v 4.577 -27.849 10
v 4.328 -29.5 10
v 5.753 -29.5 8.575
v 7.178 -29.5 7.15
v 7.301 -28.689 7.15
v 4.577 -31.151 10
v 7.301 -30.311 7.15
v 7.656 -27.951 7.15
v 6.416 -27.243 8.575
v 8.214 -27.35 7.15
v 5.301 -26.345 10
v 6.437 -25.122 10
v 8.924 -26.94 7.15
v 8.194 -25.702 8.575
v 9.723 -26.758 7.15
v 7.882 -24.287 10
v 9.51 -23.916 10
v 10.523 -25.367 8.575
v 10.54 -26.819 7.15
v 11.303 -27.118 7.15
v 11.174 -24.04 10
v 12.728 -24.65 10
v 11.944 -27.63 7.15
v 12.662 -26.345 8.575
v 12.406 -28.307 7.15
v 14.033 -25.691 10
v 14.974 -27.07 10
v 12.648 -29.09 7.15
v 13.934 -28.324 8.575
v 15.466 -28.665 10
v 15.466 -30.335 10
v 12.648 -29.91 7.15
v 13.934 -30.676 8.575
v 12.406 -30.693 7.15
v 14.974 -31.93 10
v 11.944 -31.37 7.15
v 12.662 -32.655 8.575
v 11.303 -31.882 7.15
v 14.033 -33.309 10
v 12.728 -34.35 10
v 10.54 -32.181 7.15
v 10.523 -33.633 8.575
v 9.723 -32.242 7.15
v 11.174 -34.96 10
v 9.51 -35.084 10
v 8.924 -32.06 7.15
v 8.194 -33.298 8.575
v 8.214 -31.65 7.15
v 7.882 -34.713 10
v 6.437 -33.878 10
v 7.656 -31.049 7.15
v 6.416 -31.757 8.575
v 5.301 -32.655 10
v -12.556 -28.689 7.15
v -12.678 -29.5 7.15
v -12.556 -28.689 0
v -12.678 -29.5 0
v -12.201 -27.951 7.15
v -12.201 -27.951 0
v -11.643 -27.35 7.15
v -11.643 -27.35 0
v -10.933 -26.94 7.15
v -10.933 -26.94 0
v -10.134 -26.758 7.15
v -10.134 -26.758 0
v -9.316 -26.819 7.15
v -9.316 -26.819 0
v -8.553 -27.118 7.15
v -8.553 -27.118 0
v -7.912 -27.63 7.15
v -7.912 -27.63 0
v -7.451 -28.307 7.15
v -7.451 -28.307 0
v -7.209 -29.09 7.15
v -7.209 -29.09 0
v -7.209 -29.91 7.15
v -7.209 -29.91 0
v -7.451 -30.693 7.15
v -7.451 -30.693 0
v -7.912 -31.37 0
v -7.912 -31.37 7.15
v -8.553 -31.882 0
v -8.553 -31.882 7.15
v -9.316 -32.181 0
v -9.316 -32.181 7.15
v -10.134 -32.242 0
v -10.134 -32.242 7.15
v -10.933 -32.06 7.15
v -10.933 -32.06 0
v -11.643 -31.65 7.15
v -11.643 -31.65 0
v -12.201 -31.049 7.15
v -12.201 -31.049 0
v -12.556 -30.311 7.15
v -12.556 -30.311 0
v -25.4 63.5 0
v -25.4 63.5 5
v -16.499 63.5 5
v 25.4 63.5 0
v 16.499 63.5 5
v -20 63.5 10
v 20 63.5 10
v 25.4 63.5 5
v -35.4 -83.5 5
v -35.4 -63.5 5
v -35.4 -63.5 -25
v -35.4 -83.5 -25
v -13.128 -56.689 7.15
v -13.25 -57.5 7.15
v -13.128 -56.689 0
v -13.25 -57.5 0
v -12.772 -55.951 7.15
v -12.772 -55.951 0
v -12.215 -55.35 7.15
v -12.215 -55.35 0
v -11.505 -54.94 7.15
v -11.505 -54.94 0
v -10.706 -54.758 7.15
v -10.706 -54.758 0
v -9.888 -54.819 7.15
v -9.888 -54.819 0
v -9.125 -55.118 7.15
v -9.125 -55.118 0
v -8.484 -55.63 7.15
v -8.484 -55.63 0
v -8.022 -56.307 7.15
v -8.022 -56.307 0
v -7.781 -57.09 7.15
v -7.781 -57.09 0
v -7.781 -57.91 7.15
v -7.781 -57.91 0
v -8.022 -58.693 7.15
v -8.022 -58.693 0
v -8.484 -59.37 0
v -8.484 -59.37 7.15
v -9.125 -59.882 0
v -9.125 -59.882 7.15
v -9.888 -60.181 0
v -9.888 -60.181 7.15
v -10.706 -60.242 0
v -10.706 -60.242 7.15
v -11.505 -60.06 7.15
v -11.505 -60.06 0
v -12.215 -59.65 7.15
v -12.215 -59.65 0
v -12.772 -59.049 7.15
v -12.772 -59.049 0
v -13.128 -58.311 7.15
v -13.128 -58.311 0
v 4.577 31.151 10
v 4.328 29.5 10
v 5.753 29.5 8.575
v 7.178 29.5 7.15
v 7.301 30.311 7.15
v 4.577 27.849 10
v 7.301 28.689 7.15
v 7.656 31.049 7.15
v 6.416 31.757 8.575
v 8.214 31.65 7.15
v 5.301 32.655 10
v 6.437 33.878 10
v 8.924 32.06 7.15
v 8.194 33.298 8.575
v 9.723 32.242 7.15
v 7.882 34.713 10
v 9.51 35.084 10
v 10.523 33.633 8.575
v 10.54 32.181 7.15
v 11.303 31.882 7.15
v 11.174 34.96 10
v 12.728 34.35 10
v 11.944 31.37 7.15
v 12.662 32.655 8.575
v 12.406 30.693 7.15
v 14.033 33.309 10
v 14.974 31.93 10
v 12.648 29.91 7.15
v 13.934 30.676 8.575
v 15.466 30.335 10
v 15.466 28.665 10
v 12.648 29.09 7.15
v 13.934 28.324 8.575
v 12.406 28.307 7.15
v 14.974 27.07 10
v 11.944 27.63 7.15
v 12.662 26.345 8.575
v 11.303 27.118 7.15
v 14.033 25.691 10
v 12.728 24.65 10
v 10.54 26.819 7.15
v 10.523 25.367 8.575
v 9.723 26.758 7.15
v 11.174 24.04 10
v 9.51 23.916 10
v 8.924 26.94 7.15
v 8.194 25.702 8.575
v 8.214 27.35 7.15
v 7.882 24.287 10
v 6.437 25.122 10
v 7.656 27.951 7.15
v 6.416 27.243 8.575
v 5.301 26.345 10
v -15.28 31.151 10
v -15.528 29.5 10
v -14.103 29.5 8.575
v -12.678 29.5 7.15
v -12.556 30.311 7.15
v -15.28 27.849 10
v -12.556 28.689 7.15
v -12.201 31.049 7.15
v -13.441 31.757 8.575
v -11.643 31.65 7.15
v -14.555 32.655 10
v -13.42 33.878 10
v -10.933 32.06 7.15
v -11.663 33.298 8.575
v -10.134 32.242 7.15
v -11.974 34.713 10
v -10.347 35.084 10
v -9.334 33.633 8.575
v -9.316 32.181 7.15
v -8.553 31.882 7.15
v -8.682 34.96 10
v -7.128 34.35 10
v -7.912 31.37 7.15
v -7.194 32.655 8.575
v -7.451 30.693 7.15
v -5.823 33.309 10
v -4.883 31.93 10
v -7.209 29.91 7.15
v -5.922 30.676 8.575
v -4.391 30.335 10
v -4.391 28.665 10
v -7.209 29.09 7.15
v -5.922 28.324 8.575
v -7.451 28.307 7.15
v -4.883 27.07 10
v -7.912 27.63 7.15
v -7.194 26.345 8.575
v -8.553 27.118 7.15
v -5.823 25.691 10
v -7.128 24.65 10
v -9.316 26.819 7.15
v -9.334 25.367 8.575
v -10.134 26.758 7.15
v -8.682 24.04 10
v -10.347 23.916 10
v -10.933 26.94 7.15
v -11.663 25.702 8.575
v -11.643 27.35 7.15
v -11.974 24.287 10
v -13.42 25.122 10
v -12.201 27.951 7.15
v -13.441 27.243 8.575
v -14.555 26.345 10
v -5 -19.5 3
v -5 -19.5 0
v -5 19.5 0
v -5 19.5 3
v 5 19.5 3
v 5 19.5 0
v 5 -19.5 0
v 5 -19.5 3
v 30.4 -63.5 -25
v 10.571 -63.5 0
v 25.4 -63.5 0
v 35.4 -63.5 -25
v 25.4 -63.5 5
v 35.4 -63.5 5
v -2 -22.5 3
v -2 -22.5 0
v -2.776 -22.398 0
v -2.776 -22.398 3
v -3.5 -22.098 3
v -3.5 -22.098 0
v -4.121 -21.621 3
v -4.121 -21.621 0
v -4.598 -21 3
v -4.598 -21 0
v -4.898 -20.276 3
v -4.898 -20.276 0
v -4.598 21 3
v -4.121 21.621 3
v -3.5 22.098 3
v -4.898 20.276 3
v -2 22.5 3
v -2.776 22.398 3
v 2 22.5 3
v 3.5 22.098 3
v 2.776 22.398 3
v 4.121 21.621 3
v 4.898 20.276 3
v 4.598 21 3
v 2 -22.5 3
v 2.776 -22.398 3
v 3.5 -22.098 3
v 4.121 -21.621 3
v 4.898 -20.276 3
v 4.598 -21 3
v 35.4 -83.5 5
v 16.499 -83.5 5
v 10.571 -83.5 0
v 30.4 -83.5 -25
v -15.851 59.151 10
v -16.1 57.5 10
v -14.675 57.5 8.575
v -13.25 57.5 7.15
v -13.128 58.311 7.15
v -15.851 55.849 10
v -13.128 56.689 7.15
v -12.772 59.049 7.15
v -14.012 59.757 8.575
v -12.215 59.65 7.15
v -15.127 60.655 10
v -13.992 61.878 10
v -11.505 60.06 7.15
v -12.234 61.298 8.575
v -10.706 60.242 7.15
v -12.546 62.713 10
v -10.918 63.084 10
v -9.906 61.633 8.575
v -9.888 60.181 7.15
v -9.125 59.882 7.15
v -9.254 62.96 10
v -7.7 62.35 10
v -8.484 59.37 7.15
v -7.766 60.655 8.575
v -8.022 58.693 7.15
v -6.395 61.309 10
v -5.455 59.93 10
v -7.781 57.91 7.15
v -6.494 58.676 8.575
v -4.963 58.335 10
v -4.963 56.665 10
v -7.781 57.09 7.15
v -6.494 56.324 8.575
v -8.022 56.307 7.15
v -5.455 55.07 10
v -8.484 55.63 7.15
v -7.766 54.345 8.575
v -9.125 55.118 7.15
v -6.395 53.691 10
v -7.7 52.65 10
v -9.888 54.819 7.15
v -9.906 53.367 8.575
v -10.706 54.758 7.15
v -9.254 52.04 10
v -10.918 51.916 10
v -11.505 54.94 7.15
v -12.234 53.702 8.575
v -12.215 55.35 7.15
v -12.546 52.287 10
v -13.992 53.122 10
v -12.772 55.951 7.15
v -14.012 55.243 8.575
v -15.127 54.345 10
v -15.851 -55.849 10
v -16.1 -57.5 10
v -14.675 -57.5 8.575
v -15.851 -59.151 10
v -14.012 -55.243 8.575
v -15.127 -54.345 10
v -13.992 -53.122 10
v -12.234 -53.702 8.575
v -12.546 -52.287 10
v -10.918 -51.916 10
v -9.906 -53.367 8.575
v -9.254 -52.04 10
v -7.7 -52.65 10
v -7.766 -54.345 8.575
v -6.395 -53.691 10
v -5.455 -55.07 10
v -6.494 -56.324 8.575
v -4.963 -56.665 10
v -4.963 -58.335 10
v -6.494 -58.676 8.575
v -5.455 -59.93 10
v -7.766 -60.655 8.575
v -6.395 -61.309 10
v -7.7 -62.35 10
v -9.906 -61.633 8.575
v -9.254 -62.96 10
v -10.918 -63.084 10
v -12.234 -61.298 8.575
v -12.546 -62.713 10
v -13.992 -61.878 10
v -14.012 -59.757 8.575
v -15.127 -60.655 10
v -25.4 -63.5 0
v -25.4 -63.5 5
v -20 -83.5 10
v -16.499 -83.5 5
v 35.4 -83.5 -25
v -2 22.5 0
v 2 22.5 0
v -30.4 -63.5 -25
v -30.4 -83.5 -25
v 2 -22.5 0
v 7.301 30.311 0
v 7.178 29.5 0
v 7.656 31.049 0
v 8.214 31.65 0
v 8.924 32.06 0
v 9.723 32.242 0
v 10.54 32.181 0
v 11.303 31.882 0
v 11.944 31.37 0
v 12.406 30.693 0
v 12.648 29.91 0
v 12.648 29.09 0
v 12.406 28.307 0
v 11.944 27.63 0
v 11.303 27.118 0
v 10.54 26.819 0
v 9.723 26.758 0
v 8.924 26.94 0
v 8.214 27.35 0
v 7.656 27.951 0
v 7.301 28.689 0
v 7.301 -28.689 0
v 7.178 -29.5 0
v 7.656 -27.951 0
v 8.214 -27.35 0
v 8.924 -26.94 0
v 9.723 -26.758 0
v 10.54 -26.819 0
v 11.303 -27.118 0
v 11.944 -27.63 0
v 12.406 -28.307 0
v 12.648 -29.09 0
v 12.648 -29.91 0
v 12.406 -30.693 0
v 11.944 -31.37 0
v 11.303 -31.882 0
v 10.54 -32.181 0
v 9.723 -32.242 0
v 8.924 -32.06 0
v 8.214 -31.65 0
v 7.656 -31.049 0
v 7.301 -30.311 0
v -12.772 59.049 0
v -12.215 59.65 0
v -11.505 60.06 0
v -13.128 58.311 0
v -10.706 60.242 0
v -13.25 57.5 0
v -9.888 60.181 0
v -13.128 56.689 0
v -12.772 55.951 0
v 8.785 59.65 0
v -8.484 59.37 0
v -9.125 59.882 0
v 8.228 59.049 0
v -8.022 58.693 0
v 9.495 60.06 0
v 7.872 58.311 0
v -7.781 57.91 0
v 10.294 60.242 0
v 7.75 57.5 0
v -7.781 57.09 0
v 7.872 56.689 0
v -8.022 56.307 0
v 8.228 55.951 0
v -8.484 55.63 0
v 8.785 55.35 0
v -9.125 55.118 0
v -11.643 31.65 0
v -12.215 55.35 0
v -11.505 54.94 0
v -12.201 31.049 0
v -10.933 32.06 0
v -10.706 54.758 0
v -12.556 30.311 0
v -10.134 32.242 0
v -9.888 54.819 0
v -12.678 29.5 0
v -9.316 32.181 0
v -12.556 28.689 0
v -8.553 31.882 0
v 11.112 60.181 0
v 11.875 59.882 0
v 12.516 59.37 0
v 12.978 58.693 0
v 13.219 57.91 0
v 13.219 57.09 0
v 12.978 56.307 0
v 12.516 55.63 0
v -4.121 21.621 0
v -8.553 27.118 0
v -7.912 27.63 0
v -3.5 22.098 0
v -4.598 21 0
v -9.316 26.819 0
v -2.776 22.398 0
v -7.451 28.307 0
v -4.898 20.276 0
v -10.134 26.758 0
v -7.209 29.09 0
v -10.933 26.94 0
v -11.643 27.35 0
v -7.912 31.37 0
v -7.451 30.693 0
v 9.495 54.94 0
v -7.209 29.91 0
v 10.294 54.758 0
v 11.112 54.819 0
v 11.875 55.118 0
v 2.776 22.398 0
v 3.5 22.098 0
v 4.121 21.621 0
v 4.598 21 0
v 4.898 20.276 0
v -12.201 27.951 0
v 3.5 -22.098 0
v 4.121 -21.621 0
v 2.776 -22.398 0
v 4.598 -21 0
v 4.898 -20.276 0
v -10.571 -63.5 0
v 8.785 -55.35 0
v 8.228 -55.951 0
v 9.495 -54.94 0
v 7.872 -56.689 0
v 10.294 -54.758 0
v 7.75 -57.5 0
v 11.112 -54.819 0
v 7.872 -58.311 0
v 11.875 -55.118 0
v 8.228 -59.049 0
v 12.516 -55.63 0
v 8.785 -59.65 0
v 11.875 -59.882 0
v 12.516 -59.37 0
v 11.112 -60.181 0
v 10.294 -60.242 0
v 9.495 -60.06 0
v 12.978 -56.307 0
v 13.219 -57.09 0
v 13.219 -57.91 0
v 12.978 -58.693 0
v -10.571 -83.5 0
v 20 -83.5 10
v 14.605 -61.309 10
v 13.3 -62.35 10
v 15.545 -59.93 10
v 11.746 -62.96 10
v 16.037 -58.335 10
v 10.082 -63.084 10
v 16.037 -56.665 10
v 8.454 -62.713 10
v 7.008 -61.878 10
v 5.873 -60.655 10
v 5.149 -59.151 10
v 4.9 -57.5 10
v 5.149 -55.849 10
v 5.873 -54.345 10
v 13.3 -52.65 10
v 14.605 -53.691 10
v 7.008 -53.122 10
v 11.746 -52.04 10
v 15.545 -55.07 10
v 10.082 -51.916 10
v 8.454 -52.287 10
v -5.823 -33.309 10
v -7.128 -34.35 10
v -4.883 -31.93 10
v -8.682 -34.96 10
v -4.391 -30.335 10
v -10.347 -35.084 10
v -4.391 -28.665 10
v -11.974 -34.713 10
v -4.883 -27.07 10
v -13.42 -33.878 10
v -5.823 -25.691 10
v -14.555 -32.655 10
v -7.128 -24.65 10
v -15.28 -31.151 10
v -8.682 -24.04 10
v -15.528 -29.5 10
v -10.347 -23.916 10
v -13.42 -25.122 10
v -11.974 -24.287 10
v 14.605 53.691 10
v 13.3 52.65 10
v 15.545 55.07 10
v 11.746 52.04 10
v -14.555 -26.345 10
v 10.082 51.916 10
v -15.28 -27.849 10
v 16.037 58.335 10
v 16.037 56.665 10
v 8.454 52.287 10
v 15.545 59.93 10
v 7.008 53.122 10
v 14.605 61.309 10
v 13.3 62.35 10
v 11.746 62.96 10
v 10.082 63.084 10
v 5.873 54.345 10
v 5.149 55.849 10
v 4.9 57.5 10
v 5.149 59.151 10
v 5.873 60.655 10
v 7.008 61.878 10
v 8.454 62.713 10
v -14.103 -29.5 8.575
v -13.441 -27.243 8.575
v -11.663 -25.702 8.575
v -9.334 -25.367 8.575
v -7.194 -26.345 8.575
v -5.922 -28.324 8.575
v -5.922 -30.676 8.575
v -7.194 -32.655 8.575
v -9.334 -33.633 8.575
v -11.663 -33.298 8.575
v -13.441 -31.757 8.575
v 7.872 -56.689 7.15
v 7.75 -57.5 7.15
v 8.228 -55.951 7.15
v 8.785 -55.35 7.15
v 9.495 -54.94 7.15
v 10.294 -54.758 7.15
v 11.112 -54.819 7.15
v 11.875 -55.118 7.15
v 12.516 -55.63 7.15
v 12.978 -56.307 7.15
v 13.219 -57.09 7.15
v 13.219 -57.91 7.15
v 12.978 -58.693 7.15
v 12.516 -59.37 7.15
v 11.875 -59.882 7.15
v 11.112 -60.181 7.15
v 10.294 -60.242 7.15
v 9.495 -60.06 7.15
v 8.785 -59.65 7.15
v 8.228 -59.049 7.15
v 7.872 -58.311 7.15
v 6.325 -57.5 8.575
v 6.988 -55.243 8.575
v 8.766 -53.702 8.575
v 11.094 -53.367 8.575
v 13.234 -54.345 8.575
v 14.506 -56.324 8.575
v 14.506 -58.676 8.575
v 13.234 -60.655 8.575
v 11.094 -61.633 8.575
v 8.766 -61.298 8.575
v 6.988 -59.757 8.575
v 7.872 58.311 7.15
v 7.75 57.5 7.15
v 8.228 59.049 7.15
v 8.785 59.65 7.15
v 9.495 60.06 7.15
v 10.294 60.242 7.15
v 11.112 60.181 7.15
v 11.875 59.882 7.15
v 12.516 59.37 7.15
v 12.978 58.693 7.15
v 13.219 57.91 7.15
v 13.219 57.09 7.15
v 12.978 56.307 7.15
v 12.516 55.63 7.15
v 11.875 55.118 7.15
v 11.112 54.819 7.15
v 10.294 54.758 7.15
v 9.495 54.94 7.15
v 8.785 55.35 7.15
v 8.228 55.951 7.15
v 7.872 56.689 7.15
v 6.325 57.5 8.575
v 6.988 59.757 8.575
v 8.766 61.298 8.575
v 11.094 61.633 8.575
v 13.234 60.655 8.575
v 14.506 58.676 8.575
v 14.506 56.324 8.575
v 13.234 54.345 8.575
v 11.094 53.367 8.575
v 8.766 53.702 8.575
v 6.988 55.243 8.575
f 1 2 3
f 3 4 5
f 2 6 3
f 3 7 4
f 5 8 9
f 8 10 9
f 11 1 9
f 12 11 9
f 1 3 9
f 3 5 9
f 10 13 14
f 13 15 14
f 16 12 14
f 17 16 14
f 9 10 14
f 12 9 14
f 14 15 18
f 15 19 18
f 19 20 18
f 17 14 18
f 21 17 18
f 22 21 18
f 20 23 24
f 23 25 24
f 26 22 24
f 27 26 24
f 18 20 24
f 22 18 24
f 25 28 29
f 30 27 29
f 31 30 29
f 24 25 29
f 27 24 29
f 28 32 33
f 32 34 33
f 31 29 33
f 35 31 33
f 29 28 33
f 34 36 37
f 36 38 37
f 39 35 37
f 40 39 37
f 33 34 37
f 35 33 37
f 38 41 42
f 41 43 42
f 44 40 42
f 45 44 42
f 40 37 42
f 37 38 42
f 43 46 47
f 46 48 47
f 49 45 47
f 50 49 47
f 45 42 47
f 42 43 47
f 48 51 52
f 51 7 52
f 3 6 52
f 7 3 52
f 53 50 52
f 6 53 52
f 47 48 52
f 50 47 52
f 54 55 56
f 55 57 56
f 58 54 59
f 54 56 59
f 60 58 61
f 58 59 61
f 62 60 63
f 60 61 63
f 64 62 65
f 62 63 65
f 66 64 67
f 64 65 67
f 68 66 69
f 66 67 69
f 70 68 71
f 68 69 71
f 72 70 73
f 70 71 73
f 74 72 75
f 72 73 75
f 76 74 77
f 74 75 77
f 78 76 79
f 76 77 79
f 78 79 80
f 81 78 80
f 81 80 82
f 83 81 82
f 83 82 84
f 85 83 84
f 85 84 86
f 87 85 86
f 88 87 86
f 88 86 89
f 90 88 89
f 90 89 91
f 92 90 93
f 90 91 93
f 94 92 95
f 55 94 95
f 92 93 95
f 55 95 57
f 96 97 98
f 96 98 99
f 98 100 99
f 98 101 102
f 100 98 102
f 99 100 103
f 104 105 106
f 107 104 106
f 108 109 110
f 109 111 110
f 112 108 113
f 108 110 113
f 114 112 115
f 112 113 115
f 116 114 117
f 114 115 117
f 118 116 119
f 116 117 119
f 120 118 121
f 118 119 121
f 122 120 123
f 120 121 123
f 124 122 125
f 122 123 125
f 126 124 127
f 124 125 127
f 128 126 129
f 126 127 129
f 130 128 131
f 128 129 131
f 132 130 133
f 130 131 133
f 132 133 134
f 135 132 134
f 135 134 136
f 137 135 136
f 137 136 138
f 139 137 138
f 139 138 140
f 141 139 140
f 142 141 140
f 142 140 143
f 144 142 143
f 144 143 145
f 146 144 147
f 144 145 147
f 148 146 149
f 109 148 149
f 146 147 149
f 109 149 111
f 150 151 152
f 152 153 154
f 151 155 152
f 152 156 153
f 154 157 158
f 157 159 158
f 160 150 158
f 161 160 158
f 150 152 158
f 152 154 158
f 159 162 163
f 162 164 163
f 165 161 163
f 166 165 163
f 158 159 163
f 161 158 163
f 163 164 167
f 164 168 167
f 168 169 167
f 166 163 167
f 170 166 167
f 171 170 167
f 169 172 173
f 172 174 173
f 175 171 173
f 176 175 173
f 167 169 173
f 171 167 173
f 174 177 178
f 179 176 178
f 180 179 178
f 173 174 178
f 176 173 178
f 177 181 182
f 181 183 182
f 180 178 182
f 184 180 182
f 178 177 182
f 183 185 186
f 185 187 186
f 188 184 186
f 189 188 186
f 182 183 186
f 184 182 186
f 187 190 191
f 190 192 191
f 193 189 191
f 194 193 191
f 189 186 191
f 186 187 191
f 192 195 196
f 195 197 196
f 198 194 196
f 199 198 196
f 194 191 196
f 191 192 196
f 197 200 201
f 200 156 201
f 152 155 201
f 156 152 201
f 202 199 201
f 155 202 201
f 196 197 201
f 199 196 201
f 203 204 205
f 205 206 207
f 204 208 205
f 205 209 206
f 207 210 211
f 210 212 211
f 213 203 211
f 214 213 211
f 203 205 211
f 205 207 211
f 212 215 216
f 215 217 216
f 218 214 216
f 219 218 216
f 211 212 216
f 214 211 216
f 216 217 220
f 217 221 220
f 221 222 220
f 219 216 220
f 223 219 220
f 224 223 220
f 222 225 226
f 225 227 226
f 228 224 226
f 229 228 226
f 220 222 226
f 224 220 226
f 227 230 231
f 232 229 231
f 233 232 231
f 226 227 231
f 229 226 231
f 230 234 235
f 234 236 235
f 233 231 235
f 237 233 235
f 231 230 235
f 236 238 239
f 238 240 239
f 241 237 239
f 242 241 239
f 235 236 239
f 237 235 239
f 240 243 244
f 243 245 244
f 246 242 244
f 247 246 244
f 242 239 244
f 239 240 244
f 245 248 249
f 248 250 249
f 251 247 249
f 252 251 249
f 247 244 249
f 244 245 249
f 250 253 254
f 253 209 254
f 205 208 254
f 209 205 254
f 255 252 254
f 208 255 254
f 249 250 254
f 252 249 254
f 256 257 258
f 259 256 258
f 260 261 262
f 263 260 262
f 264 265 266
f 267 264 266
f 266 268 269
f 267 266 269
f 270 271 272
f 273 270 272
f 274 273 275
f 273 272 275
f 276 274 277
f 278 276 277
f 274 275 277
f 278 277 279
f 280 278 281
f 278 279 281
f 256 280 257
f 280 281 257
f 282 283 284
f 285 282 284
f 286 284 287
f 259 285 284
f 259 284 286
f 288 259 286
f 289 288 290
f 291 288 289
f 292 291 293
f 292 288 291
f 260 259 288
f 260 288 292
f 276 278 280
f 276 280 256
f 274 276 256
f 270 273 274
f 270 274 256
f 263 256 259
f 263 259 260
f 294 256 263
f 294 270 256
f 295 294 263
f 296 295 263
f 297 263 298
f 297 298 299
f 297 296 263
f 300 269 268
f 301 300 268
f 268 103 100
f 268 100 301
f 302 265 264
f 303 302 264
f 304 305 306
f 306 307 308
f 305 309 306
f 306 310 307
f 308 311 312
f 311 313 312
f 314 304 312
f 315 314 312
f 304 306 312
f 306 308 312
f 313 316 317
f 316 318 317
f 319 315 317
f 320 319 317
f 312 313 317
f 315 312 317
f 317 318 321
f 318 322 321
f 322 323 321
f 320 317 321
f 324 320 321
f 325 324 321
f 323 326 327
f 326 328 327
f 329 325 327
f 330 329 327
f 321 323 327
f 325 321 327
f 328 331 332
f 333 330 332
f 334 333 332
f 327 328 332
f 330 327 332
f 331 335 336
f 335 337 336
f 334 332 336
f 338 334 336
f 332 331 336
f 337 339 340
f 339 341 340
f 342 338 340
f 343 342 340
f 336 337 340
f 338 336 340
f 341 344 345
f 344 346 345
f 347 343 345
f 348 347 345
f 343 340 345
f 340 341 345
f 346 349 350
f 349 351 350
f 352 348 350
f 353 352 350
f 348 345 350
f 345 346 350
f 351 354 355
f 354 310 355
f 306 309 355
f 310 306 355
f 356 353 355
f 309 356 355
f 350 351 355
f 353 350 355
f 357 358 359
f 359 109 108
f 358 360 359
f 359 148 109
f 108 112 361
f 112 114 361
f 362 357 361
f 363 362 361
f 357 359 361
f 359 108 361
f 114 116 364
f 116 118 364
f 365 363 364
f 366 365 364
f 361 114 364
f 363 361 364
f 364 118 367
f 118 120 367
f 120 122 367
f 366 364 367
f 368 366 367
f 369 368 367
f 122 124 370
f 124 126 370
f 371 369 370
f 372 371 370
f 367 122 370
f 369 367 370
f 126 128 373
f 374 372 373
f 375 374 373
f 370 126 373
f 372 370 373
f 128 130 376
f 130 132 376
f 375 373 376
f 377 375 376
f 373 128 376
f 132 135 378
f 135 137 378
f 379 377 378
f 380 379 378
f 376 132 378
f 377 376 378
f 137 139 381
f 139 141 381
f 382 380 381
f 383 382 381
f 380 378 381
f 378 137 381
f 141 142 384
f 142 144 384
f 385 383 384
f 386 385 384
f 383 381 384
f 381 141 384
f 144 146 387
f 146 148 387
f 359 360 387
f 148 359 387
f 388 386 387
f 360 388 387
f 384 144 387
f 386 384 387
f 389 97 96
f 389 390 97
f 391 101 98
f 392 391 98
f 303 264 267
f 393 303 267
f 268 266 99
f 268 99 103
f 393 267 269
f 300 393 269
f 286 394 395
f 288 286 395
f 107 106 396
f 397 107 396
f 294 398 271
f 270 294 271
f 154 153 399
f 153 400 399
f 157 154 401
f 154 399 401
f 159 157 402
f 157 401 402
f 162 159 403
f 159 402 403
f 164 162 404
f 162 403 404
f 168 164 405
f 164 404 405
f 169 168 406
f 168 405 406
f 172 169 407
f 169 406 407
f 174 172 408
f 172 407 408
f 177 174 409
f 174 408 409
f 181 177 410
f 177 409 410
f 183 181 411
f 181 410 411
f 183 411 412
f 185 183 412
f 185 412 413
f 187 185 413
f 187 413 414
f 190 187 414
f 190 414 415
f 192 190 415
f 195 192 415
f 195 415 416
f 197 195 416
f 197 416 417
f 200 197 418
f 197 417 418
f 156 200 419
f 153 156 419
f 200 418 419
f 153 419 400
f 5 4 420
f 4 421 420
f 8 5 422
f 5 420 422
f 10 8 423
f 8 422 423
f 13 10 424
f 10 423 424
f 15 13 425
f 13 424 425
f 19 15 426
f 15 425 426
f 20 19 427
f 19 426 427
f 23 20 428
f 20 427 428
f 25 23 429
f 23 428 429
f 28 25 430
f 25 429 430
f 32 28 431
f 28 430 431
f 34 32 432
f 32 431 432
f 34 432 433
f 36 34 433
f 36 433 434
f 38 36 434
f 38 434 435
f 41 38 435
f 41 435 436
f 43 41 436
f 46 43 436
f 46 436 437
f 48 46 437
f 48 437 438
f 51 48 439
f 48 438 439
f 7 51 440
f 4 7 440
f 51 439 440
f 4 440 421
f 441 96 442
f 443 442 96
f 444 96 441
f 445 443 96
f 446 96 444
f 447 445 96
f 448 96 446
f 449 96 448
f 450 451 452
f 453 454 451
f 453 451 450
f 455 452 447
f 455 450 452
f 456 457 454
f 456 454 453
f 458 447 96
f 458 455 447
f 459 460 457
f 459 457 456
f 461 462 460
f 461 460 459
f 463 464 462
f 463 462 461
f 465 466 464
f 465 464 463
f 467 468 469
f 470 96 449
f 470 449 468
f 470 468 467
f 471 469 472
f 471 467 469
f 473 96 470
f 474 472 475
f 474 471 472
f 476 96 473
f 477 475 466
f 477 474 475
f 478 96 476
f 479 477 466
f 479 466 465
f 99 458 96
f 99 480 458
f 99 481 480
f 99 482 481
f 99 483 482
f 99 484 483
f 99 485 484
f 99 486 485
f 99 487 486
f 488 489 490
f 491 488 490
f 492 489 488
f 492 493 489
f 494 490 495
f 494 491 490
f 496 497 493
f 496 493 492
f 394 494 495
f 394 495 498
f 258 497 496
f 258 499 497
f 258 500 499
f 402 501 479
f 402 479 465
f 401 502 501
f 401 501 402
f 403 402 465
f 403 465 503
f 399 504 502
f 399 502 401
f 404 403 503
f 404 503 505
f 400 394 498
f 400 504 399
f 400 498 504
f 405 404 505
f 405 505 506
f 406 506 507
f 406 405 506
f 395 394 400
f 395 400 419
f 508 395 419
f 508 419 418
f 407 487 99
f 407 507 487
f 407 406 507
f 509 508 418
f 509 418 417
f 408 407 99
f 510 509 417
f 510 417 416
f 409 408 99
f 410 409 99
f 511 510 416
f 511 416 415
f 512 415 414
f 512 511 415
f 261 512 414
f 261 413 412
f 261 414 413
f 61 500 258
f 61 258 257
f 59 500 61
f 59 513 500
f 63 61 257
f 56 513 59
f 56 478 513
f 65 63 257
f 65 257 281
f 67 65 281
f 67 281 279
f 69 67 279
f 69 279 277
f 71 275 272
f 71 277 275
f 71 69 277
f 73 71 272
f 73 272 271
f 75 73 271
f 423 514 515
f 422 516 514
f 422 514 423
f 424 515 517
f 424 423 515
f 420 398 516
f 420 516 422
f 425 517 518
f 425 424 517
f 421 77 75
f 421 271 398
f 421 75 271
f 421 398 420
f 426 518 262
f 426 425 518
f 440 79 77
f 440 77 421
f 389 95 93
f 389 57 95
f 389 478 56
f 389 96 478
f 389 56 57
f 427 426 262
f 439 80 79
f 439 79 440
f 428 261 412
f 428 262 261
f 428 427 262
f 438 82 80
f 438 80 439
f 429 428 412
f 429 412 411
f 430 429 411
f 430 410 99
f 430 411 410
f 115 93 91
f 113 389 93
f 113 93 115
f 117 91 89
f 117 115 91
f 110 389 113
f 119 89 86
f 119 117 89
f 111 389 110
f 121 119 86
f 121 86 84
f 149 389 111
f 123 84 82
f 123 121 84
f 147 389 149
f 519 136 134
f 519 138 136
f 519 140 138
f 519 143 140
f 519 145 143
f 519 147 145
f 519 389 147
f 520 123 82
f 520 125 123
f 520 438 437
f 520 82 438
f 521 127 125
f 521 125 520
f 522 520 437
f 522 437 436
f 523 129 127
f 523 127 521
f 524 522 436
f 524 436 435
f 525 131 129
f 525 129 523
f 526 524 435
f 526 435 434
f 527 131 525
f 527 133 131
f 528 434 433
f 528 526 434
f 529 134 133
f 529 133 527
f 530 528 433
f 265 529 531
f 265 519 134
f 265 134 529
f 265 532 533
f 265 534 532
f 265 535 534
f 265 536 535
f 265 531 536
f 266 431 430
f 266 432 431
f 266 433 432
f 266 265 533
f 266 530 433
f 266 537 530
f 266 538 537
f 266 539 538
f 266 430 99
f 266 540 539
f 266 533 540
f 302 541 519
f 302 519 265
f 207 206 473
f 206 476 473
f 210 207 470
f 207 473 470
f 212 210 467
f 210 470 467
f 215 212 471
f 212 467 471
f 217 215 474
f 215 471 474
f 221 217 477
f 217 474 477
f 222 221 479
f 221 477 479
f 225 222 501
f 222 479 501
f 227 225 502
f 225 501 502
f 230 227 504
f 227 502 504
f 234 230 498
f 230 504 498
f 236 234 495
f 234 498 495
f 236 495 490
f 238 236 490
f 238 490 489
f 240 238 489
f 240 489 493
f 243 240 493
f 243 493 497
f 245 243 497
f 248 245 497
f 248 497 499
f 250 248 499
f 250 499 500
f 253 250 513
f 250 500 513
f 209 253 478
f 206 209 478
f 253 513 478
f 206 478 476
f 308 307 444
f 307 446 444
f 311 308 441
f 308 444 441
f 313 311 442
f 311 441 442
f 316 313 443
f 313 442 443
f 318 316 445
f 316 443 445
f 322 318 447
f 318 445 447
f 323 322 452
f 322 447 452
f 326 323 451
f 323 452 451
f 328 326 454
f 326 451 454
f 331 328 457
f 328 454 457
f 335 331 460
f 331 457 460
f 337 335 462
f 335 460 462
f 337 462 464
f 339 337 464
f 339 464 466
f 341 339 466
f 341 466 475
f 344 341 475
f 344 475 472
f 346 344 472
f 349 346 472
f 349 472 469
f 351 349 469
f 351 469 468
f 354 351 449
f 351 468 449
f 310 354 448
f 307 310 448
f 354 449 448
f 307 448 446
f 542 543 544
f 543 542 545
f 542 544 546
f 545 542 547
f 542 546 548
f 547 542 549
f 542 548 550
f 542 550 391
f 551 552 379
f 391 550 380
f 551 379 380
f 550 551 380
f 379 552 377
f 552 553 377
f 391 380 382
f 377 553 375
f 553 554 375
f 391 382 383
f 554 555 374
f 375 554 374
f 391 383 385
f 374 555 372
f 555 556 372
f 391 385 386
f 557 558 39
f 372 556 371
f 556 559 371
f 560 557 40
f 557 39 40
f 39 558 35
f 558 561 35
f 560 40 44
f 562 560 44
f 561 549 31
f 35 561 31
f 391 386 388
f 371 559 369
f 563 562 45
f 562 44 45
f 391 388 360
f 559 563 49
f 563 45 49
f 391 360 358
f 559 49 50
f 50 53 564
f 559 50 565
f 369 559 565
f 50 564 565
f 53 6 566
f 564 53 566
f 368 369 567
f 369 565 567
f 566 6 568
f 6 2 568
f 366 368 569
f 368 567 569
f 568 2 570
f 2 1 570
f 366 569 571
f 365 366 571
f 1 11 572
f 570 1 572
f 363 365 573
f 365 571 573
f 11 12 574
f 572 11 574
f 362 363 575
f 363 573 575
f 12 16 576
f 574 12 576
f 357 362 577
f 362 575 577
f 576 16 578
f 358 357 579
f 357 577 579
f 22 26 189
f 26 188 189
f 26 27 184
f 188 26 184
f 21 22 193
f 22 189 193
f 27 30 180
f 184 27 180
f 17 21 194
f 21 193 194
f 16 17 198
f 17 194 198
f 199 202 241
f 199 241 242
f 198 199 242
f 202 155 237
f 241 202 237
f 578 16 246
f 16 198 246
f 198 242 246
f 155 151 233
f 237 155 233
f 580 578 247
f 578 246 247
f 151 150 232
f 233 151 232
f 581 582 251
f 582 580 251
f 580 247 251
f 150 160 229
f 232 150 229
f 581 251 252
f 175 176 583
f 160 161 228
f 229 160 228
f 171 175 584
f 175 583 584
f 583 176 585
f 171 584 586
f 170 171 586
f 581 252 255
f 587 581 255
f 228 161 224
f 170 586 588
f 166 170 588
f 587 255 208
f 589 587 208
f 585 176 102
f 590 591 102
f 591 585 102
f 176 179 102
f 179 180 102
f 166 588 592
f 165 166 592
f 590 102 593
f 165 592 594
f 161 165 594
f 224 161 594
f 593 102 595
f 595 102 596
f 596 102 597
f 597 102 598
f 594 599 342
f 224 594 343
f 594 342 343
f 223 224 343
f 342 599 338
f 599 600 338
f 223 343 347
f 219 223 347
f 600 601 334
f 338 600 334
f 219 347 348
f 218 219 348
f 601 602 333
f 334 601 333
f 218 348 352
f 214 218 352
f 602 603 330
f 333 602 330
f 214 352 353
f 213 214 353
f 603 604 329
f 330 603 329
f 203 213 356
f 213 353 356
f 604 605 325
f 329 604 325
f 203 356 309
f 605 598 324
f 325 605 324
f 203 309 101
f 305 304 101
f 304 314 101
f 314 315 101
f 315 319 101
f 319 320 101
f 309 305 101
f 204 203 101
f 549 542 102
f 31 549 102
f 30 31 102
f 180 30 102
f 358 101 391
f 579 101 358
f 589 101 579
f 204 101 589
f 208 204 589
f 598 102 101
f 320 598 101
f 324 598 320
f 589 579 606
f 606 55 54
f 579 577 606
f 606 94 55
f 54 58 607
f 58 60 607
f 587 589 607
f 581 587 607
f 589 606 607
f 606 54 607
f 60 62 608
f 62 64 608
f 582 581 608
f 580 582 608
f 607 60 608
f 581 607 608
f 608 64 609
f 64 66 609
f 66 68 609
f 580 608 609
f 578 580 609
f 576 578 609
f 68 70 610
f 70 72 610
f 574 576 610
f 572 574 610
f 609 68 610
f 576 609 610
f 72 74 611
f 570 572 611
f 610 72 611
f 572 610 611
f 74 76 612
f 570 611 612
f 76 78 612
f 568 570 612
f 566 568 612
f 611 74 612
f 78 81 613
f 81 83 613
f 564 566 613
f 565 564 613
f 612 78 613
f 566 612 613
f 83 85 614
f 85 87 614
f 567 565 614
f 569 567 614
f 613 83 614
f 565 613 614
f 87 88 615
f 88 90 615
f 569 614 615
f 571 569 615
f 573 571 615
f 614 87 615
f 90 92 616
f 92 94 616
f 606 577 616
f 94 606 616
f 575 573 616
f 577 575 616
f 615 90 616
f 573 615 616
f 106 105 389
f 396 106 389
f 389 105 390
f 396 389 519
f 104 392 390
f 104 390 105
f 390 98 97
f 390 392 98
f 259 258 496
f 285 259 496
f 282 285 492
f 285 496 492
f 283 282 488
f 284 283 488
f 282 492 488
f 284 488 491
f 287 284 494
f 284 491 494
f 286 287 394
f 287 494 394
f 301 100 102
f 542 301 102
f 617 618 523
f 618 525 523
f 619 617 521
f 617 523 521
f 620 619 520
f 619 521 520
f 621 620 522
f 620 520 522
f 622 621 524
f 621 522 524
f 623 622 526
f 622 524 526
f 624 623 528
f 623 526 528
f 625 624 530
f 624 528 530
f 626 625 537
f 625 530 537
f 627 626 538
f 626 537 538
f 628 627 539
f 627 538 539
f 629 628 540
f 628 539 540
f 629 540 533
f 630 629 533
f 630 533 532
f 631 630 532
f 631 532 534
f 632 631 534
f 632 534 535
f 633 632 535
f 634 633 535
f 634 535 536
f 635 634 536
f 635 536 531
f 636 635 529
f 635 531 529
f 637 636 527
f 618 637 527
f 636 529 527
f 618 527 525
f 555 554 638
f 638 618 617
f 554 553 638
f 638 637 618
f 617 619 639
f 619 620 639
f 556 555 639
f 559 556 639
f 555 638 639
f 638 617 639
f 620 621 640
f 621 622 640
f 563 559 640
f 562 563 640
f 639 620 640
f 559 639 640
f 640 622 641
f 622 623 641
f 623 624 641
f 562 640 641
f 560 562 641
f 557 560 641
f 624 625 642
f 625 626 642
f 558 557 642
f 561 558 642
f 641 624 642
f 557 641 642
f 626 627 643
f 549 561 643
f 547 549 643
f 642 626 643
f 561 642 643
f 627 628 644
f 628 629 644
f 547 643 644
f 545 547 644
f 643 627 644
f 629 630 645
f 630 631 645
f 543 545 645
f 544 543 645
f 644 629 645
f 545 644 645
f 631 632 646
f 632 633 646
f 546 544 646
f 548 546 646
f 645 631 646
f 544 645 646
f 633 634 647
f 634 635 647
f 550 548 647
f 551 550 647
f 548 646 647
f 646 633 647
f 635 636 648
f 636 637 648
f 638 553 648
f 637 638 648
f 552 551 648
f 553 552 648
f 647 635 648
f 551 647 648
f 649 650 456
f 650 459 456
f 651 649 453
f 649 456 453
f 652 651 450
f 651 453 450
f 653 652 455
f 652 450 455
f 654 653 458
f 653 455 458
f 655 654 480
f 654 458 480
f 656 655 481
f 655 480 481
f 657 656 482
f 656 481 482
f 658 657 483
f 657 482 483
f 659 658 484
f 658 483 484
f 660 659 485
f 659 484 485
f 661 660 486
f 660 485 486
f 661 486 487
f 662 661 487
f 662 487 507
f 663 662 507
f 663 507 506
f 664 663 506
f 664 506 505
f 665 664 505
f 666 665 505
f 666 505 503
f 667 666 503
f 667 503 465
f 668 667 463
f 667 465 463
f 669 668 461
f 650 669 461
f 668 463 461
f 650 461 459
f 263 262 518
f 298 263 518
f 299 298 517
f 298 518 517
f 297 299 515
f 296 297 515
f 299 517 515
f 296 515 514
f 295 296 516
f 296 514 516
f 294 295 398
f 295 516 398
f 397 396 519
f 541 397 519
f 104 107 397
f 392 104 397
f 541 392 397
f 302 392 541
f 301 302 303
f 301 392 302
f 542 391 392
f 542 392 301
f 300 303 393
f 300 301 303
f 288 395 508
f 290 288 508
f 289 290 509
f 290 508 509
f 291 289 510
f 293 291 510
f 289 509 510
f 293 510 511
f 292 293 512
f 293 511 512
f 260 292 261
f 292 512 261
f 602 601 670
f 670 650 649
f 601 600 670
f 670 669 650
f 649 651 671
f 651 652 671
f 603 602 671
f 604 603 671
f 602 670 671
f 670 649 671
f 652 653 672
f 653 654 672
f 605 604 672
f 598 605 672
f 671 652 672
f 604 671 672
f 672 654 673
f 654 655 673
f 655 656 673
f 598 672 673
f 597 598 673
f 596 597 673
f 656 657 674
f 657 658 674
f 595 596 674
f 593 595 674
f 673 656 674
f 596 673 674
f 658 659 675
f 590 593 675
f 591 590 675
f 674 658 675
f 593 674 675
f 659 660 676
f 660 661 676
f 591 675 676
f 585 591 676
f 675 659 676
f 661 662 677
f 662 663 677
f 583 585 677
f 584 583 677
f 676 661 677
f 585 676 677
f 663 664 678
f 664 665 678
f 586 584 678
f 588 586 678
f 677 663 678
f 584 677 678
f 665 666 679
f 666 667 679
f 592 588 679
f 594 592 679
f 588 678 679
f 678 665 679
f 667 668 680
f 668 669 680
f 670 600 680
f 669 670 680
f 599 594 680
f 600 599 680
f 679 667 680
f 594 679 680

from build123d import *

# Parameters (mm, degrees)
F1_DEPTH       = 63.5
F1_DEPTH_BACK  = 63.5
F4_DEPTH       = 3
F6_D           = 5.5
F6_CSINK_D     = 11.2
F6_CSINK_ANGLE = 90
F8_DEPTH       = 20
F9_DEPTH       = 20


with BuildPart() as f1:
    # F0 (on Front) → F1 (new body, two sides)
    with BuildSketch(Plane.XZ) as f1_sk:
        Polygon((-25.4, 5), (-25.4, 0), (25.4, 0), (25.4, 5), (16.498962309, 5), (20, 10), (-20, 10), (-16.498962309, 5), align=None)
    extrude(amount=F1_DEPTH)
    extrude(f1_sk.sketch, amount=-F1_DEPTH_BACK)

    # F3 (on face) → F4 (cut)
    with BuildSketch(Plane(origin=(0, 0, 0), x_dir=(1, 0, 0), z_dir=(0, 0, -1))):
        with BuildLine():
            Line((2, 22.5), (-2, 22.5))
            ThreePointArc((-2, 22.5), (-4.1213203436, 21.6213203436), (-5, 19.5))
            Line((-5, 19.5), (-5, -19.5))
            ThreePointArc((-5, -19.5), (-4.1213203436, -21.6213203436), (-2, -22.5))
            Line((-2, -22.5), (2, -22.5))
            ThreePointArc((2, -22.5), (4.1213203436, -21.6213203436), (5, -19.5))
            Line((5, -19.5), (5, 19.5))
            ThreePointArc((5, 19.5), (4.1213203436, 21.6213203436), (2, 22.5))
        make_face()
    extrude(amount=-F4_DEPTH, mode=Mode.SUBTRACT)

    # F6 (through all)
    with Locations(Plane.XY.offset(10)):
        with Locations((-10.5, 57.5), (10.5, 57.5), (-9.928368032, 29.5), (9.928368032, 29.5), (-9.928368032, -29.5), (9.928368032, -29.5), (-10.5, -57.5), (10.5, -57.5)):
            CounterSinkHole(F6_D / 2, F6_CSINK_D / 2, counter_sink_angle=F6_CSINK_ANGLE)

    # F7 (on face) → F8 (join)
    with BuildSketch(Plane.XZ.offset(63.5)):
        Polygon((35.4, 5), (25.4, 5), (0, 5), (0, 0), (10.570820421, 0), (30.4, -25), (35.4, -25), align=None)
        Polygon((0, 0), (0, 5), (-25.4, 5), (-35.4, 5), (-35.4, -25), (-30.4, -25), (-10.570820421, 0), align=None)
    extrude(amount=F8_DEPTH)

    # F9 (add): a face of the model
    f9_faces = [f1.faces().sort_by_distance(p)[0] for p in [
        (0, -63.5, 7.5799346399),
    ]]
    extrude(f9_faces, amount=F9_DEPTH)


solid = f1.part
